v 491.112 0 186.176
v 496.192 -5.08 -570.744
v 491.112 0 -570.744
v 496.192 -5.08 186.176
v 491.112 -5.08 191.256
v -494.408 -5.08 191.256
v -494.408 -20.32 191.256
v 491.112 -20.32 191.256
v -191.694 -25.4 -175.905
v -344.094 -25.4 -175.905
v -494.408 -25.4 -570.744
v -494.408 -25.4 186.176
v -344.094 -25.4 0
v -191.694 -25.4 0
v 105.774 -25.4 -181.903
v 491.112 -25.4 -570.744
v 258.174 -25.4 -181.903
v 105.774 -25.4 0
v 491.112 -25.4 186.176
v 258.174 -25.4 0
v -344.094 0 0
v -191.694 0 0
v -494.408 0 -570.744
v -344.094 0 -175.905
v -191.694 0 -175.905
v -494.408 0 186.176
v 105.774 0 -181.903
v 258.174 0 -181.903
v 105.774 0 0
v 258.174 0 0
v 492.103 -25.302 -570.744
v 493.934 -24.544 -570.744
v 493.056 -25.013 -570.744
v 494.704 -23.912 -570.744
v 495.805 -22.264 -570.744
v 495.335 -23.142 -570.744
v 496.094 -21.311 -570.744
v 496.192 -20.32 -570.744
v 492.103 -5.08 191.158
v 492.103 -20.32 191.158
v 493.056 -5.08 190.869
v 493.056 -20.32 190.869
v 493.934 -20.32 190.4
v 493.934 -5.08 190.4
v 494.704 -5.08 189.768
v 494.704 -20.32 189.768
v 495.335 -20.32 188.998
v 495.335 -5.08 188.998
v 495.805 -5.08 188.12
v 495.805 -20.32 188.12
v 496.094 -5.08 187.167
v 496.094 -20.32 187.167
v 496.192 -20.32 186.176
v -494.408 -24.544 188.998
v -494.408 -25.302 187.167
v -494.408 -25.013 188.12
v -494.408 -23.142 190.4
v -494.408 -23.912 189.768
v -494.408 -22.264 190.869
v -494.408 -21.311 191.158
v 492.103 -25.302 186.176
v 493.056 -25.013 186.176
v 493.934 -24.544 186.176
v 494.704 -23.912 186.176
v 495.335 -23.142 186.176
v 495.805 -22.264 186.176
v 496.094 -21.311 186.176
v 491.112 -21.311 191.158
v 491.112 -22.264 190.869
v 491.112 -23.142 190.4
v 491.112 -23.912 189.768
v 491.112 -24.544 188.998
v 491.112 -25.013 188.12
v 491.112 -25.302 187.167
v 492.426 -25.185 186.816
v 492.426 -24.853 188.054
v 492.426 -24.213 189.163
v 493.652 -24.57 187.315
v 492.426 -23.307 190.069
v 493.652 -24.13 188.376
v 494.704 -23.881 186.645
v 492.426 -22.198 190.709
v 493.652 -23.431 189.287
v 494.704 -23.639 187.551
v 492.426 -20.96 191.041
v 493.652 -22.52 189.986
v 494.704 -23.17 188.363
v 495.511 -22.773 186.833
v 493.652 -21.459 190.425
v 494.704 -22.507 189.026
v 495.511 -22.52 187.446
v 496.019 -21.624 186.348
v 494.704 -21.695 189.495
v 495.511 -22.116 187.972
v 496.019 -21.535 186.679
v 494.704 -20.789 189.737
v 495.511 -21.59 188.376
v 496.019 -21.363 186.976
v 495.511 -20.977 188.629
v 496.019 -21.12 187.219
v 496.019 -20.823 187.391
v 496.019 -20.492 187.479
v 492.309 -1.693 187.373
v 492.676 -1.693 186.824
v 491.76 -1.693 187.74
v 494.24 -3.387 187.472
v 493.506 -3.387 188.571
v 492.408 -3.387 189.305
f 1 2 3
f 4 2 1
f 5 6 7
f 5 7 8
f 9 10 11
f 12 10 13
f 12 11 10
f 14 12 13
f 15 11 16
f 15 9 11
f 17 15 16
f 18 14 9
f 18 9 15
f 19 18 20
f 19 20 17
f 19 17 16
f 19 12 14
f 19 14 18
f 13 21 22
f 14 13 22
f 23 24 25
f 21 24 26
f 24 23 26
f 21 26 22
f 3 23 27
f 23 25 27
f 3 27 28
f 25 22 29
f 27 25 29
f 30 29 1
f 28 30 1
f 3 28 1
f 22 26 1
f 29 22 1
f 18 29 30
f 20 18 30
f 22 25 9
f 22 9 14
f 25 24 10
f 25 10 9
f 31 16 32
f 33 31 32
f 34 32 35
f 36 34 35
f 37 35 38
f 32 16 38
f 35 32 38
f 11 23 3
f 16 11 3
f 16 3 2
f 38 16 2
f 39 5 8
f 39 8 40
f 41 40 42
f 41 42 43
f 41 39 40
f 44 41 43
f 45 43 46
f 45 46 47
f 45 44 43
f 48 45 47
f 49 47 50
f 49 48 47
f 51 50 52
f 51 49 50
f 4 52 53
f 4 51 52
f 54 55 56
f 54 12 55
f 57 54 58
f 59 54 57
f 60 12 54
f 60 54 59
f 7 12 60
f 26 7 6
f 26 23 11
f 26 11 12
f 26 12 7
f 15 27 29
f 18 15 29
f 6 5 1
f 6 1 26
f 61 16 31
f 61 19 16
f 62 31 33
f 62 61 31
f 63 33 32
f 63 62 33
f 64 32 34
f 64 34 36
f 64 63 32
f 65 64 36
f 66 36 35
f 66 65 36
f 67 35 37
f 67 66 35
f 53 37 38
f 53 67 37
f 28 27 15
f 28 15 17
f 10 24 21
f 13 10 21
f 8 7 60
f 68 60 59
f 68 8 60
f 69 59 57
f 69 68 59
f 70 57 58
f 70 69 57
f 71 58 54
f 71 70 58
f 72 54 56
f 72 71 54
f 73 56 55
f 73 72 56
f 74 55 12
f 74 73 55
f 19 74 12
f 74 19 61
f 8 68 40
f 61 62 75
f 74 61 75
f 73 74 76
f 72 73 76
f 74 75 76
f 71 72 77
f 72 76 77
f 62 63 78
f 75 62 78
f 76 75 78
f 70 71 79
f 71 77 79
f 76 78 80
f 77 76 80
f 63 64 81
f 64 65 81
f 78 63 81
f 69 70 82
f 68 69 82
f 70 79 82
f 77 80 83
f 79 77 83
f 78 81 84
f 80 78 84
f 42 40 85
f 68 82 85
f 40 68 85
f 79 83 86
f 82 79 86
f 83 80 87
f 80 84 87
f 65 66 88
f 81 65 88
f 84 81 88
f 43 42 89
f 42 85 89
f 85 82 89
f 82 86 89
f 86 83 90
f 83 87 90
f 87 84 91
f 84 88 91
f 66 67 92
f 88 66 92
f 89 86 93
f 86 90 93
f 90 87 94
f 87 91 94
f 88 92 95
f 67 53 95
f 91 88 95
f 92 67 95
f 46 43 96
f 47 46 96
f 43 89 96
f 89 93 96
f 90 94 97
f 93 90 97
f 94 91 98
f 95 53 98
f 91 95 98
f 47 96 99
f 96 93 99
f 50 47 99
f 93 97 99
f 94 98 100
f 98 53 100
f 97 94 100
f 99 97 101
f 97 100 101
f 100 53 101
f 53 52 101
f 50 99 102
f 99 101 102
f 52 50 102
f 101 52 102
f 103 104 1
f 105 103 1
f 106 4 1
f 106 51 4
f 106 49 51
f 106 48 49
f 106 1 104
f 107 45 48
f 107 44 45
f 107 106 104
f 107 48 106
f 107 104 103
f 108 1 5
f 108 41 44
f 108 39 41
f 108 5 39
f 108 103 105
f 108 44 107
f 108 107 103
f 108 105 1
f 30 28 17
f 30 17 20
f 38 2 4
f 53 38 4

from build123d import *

# Parameters (mm, degrees)
F0_W     = 990.6
F0_H     = 762
F0_W_2   = 152.4
F0_H_2   = 175.9045571089
F0_H_3   = 181.9028109312
F1_DEPTH = 25.4
F2_R     = 5.08
F3_R     = 5.08
F4_SIZE  = 5.08


with BuildPart() as f1:
    # F0 (on Front) → F1 (new body)
    with BuildSketch(Plane.XZ):
        with Locations((0.8916221559, -189.7441043131)):
            Rectangle(F0_W, F0_H)
        with Locations((-267.8943658352, -87.9522785544)):
            Rectangle(F0_W_2, F0_H_2, mode=Mode.SUBTRACT)
        with Locations((181.9738661766, -90.9514054656)):
            Rectangle(F0_W_2, F0_H_3, mode=Mode.SUBTRACT)
    extrude(amount=F1_DEPTH)

    # F2
    f2_edges = [f1.edges().sort_by_distance(p)[0] for p in [
        (0.891622, -25.4, 191.255896),
    ]]
    fillet(f2_edges, radius=F2_R)

    # F3
    f3_edges = [f1.edges().sort_by_distance(p)[0] for p in [
        (0.891622, -25.4, 186.175896),
        (496.191622, -25.4, -192.284104),
    ]]
    fillet(f3_edges, radius=F3_R)

    # F4
    f4_edges = [f1.edges().sort_by_distance(p)[0] for p in [
        (496.191622, 0, -192.284104),
    ]]
    chamfer(f4_edges, length=F4_SIZE)


solid = f1.part
